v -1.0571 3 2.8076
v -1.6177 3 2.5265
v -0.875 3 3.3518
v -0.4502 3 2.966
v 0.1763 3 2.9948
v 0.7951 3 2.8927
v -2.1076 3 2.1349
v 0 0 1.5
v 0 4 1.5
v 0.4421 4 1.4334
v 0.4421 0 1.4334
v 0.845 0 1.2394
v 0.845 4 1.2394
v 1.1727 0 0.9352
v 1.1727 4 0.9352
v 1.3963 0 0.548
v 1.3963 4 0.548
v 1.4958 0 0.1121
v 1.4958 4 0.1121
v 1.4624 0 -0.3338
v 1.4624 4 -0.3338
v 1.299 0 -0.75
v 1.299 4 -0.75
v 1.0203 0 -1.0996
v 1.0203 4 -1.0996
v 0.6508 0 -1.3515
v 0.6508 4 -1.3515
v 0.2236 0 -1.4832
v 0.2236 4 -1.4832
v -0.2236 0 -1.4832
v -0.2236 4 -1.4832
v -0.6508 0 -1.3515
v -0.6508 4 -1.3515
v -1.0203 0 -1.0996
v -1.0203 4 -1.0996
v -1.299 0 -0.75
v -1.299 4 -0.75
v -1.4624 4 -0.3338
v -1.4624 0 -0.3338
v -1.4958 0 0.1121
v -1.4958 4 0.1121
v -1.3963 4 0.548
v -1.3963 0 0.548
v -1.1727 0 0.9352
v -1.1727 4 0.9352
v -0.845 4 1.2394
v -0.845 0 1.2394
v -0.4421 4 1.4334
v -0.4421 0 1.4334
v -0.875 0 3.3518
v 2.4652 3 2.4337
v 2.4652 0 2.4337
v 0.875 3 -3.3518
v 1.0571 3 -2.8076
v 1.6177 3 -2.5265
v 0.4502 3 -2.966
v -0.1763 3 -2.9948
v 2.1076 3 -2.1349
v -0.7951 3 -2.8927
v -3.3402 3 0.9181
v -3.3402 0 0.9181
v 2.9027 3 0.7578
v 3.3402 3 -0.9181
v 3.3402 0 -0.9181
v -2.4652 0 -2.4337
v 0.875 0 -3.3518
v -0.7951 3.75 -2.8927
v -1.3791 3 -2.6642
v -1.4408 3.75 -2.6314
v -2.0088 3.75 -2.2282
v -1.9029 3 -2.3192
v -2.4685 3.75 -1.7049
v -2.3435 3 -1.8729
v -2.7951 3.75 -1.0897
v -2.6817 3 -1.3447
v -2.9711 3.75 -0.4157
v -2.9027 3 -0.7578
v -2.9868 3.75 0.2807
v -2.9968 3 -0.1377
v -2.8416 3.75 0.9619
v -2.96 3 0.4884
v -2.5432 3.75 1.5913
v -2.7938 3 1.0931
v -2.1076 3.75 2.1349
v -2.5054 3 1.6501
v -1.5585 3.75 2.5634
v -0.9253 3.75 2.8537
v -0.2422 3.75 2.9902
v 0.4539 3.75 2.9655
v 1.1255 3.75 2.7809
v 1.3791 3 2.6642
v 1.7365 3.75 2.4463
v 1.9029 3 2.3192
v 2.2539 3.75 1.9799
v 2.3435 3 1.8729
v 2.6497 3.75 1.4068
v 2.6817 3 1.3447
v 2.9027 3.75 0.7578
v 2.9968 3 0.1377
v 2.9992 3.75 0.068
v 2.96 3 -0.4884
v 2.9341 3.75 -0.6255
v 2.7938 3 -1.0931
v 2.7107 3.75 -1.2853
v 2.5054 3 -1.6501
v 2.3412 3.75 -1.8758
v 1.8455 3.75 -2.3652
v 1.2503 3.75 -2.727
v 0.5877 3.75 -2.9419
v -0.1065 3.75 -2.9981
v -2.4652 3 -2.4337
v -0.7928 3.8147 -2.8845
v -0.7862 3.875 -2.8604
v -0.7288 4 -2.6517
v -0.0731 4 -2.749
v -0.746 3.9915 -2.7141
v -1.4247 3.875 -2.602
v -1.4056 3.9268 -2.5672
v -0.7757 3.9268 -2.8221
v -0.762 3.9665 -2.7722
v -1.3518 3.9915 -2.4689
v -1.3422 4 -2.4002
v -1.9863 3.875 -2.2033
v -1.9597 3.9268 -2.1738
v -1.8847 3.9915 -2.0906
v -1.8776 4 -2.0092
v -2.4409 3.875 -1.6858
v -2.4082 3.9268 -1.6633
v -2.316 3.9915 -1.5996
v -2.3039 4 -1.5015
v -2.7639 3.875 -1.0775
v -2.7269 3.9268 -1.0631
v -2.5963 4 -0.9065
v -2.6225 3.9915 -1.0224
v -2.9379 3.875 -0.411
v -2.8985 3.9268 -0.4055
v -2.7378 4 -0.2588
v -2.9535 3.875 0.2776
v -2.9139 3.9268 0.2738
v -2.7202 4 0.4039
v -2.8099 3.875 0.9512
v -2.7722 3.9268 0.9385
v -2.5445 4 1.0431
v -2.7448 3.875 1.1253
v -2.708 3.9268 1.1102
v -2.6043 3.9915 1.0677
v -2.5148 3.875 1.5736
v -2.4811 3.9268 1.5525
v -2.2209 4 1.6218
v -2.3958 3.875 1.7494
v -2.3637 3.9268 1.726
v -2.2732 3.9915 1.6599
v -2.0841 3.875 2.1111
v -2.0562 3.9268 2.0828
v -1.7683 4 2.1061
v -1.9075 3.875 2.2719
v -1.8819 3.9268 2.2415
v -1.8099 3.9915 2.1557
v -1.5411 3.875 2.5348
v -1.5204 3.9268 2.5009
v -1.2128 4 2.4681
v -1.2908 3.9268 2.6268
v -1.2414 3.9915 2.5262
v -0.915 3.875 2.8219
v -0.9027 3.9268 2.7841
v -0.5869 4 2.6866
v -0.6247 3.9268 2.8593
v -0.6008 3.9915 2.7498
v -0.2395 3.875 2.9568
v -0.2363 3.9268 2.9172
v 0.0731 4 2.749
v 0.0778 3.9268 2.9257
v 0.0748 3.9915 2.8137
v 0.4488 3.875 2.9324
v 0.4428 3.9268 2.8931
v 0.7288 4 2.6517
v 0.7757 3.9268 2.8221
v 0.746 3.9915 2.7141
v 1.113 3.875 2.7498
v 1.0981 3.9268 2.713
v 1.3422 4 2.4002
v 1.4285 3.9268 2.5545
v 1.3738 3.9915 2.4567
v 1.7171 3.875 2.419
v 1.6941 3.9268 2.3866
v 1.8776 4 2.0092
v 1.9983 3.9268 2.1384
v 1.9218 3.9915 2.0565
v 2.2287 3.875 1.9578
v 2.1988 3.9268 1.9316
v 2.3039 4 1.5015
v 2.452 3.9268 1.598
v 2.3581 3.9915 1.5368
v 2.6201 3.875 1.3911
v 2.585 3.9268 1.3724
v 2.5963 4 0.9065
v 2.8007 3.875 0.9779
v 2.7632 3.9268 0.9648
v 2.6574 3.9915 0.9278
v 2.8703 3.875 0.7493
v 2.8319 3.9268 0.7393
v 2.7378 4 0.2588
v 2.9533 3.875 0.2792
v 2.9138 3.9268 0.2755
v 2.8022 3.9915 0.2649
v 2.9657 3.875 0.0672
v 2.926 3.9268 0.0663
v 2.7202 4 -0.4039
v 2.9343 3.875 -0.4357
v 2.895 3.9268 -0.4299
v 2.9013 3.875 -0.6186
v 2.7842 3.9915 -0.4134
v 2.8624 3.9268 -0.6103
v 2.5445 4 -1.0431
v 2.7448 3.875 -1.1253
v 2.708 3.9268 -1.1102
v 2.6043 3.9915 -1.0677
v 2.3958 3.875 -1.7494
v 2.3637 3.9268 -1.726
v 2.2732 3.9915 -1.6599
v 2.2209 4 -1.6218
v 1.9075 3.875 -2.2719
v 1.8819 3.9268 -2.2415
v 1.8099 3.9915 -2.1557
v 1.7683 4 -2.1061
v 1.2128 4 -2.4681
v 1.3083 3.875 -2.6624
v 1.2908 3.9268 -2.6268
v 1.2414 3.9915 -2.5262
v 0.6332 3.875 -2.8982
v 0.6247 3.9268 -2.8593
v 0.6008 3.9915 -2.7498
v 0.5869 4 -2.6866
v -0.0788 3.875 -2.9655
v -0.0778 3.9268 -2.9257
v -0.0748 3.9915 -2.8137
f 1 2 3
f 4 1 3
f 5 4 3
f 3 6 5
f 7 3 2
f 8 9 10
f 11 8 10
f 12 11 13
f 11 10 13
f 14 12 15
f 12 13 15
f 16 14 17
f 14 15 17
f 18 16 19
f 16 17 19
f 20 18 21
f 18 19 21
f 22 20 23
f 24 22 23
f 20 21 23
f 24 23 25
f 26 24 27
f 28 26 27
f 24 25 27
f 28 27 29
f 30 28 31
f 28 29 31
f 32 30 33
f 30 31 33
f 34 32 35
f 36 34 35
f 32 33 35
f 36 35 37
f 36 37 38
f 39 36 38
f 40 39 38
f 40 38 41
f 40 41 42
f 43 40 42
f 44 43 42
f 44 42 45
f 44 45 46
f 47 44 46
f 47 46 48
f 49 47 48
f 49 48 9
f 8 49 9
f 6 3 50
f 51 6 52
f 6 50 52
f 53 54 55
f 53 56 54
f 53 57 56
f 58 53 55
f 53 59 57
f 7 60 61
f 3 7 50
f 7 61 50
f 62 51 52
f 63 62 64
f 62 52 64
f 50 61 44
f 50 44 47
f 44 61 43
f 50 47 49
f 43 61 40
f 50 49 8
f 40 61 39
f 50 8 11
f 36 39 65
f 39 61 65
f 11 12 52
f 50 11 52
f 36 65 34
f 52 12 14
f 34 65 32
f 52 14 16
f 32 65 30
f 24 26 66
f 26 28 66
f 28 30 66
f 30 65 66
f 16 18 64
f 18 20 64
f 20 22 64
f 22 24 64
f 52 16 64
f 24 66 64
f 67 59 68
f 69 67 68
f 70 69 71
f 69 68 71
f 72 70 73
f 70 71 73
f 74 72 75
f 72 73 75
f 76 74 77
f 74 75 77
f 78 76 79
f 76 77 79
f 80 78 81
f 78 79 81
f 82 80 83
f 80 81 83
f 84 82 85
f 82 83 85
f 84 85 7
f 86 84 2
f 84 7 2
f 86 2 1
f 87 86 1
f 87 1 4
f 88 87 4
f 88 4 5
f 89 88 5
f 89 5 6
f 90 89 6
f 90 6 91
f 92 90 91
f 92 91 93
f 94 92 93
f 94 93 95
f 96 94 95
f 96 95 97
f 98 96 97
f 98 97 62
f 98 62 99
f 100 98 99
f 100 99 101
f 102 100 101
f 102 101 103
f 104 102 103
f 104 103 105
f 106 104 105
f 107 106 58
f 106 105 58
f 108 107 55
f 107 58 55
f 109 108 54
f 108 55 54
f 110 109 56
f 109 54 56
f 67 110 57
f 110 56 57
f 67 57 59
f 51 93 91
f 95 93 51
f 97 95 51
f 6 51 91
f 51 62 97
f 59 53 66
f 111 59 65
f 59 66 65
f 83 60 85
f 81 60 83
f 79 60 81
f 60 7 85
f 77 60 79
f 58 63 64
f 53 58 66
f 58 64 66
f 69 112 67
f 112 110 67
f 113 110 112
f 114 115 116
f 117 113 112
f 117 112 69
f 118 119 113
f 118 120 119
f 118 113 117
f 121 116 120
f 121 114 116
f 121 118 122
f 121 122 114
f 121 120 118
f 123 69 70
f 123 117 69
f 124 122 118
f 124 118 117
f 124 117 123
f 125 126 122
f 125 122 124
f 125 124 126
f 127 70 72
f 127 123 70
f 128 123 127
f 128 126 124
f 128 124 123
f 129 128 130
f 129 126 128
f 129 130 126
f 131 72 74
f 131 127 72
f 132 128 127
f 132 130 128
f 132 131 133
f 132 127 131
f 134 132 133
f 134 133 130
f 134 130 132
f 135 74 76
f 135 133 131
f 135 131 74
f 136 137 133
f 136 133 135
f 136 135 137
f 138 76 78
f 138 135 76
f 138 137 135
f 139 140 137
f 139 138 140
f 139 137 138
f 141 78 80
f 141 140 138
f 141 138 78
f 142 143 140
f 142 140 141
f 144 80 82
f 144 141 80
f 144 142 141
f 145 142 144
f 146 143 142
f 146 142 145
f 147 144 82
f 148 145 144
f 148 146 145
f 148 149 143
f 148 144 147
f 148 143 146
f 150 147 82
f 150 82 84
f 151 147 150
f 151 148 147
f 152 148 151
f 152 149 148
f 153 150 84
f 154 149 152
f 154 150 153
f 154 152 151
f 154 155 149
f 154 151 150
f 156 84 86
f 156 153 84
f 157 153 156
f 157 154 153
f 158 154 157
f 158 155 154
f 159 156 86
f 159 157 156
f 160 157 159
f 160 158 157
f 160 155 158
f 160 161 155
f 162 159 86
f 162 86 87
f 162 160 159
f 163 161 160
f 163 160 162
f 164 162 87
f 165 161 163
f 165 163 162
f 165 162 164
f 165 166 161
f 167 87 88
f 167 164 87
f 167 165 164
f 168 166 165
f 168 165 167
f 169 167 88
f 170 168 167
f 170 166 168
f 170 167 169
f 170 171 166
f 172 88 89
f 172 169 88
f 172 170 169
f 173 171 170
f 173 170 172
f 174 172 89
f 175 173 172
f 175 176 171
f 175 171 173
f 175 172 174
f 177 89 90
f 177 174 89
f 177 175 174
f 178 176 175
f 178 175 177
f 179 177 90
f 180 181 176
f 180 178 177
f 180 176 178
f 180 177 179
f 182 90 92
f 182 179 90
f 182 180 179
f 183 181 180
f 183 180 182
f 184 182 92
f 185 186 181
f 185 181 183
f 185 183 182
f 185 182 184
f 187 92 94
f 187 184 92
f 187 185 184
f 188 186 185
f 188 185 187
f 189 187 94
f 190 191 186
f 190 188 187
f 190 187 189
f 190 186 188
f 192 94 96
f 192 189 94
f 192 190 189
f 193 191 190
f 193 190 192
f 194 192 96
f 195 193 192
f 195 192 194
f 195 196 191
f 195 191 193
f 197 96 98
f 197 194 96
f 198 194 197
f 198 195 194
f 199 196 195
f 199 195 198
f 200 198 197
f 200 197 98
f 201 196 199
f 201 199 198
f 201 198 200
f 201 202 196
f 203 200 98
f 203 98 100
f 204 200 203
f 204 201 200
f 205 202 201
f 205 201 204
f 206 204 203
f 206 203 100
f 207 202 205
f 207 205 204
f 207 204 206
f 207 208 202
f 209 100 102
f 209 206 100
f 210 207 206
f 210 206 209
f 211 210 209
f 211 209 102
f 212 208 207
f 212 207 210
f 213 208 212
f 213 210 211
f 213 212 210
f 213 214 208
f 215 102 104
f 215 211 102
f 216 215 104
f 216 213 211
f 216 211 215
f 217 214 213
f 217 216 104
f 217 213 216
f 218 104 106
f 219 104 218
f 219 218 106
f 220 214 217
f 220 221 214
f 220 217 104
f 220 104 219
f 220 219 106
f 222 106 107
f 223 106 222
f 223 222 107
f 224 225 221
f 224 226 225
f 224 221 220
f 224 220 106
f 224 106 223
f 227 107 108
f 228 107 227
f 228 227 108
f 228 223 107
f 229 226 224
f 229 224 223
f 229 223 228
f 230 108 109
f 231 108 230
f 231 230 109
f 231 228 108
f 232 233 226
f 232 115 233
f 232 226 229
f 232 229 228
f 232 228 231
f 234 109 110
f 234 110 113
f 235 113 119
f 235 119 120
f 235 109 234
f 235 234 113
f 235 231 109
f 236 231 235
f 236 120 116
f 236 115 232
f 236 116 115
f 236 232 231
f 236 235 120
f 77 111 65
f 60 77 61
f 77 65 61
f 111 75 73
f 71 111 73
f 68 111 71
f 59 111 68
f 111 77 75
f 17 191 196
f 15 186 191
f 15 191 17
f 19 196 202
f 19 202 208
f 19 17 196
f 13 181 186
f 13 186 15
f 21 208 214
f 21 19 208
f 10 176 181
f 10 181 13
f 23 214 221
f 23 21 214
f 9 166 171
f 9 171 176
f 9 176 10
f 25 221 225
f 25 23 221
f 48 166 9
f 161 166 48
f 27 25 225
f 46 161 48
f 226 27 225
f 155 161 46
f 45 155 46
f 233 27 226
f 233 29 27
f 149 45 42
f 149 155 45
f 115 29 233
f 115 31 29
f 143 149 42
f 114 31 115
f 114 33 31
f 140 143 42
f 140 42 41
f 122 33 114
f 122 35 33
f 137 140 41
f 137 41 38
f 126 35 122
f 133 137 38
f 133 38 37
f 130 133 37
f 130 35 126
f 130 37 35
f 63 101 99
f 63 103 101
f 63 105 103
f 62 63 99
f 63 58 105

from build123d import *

# Parameters (mm, degrees)
BOSS_EXTRUDE1_DEPTH = 3
SKETCH3_R           = 3
BOSS_EXTRUDE2_DEPTH = 1
CUT_EXTRUDE1_REACH  = 8.196
SKETCH4_R           = 1.5
FILLET1_R           = 0.25


with BuildPart() as part:
    # Sketch1 → Boss-Extrude1 (new body)
    with BuildSketch(Plane(origin=(0, 0, 0), x_dir=(1, 0, 0), z_dir=(0, 1, 0))):
        Polygon((2.465199296, -2.433678786), (3.340227301, 0.918085822), (0.875028005, 3.351764608), (-2.465199296, 2.433678786), (-3.340227301, -0.918085822), (-0.875028005, -3.351764608), align=None)
    extrude(amount=BOSS_EXTRUDE1_DEPTH)

    # Sketch3 → Boss-Extrude2 (add)
    with BuildSketch(Plane(origin=(0, 3, 0), x_dir=(1, 0, 0), z_dir=(0, 1, 0))):
        Circle(SKETCH3_R)
    extrude(amount=BOSS_EXTRUDE2_DEPTH)

    # Sketch4 → Cut-Extrude1 (cut, up to next)
    with BuildSketch(Plane(origin=(0, 4, 0), x_dir=(1, 0, 0), z_dir=(0, 1, 0)), mode=Mode.PRIVATE) as cut_extrude1_sk1:
        Circle(SKETCH4_R)
    cut_extrude1_tool1 = extrude(cut_extrude1_sk1.sketch, amount=-CUT_EXTRUDE1_REACH, mode=Mode.PRIVATE) & part.part
    add(cut_extrude1_tool1.solids().sort_by_distance((0, 4, 0))[0], mode=Mode.SUBTRACT)

    # Fillet1
    fillet1_edges = [part.edges().sort_by_distance(p)[0] for p in [
        (-3, 4, 0),
    ]]
    fillet(fillet1_edges, radius=FILLET1_R)


solid = part.part
